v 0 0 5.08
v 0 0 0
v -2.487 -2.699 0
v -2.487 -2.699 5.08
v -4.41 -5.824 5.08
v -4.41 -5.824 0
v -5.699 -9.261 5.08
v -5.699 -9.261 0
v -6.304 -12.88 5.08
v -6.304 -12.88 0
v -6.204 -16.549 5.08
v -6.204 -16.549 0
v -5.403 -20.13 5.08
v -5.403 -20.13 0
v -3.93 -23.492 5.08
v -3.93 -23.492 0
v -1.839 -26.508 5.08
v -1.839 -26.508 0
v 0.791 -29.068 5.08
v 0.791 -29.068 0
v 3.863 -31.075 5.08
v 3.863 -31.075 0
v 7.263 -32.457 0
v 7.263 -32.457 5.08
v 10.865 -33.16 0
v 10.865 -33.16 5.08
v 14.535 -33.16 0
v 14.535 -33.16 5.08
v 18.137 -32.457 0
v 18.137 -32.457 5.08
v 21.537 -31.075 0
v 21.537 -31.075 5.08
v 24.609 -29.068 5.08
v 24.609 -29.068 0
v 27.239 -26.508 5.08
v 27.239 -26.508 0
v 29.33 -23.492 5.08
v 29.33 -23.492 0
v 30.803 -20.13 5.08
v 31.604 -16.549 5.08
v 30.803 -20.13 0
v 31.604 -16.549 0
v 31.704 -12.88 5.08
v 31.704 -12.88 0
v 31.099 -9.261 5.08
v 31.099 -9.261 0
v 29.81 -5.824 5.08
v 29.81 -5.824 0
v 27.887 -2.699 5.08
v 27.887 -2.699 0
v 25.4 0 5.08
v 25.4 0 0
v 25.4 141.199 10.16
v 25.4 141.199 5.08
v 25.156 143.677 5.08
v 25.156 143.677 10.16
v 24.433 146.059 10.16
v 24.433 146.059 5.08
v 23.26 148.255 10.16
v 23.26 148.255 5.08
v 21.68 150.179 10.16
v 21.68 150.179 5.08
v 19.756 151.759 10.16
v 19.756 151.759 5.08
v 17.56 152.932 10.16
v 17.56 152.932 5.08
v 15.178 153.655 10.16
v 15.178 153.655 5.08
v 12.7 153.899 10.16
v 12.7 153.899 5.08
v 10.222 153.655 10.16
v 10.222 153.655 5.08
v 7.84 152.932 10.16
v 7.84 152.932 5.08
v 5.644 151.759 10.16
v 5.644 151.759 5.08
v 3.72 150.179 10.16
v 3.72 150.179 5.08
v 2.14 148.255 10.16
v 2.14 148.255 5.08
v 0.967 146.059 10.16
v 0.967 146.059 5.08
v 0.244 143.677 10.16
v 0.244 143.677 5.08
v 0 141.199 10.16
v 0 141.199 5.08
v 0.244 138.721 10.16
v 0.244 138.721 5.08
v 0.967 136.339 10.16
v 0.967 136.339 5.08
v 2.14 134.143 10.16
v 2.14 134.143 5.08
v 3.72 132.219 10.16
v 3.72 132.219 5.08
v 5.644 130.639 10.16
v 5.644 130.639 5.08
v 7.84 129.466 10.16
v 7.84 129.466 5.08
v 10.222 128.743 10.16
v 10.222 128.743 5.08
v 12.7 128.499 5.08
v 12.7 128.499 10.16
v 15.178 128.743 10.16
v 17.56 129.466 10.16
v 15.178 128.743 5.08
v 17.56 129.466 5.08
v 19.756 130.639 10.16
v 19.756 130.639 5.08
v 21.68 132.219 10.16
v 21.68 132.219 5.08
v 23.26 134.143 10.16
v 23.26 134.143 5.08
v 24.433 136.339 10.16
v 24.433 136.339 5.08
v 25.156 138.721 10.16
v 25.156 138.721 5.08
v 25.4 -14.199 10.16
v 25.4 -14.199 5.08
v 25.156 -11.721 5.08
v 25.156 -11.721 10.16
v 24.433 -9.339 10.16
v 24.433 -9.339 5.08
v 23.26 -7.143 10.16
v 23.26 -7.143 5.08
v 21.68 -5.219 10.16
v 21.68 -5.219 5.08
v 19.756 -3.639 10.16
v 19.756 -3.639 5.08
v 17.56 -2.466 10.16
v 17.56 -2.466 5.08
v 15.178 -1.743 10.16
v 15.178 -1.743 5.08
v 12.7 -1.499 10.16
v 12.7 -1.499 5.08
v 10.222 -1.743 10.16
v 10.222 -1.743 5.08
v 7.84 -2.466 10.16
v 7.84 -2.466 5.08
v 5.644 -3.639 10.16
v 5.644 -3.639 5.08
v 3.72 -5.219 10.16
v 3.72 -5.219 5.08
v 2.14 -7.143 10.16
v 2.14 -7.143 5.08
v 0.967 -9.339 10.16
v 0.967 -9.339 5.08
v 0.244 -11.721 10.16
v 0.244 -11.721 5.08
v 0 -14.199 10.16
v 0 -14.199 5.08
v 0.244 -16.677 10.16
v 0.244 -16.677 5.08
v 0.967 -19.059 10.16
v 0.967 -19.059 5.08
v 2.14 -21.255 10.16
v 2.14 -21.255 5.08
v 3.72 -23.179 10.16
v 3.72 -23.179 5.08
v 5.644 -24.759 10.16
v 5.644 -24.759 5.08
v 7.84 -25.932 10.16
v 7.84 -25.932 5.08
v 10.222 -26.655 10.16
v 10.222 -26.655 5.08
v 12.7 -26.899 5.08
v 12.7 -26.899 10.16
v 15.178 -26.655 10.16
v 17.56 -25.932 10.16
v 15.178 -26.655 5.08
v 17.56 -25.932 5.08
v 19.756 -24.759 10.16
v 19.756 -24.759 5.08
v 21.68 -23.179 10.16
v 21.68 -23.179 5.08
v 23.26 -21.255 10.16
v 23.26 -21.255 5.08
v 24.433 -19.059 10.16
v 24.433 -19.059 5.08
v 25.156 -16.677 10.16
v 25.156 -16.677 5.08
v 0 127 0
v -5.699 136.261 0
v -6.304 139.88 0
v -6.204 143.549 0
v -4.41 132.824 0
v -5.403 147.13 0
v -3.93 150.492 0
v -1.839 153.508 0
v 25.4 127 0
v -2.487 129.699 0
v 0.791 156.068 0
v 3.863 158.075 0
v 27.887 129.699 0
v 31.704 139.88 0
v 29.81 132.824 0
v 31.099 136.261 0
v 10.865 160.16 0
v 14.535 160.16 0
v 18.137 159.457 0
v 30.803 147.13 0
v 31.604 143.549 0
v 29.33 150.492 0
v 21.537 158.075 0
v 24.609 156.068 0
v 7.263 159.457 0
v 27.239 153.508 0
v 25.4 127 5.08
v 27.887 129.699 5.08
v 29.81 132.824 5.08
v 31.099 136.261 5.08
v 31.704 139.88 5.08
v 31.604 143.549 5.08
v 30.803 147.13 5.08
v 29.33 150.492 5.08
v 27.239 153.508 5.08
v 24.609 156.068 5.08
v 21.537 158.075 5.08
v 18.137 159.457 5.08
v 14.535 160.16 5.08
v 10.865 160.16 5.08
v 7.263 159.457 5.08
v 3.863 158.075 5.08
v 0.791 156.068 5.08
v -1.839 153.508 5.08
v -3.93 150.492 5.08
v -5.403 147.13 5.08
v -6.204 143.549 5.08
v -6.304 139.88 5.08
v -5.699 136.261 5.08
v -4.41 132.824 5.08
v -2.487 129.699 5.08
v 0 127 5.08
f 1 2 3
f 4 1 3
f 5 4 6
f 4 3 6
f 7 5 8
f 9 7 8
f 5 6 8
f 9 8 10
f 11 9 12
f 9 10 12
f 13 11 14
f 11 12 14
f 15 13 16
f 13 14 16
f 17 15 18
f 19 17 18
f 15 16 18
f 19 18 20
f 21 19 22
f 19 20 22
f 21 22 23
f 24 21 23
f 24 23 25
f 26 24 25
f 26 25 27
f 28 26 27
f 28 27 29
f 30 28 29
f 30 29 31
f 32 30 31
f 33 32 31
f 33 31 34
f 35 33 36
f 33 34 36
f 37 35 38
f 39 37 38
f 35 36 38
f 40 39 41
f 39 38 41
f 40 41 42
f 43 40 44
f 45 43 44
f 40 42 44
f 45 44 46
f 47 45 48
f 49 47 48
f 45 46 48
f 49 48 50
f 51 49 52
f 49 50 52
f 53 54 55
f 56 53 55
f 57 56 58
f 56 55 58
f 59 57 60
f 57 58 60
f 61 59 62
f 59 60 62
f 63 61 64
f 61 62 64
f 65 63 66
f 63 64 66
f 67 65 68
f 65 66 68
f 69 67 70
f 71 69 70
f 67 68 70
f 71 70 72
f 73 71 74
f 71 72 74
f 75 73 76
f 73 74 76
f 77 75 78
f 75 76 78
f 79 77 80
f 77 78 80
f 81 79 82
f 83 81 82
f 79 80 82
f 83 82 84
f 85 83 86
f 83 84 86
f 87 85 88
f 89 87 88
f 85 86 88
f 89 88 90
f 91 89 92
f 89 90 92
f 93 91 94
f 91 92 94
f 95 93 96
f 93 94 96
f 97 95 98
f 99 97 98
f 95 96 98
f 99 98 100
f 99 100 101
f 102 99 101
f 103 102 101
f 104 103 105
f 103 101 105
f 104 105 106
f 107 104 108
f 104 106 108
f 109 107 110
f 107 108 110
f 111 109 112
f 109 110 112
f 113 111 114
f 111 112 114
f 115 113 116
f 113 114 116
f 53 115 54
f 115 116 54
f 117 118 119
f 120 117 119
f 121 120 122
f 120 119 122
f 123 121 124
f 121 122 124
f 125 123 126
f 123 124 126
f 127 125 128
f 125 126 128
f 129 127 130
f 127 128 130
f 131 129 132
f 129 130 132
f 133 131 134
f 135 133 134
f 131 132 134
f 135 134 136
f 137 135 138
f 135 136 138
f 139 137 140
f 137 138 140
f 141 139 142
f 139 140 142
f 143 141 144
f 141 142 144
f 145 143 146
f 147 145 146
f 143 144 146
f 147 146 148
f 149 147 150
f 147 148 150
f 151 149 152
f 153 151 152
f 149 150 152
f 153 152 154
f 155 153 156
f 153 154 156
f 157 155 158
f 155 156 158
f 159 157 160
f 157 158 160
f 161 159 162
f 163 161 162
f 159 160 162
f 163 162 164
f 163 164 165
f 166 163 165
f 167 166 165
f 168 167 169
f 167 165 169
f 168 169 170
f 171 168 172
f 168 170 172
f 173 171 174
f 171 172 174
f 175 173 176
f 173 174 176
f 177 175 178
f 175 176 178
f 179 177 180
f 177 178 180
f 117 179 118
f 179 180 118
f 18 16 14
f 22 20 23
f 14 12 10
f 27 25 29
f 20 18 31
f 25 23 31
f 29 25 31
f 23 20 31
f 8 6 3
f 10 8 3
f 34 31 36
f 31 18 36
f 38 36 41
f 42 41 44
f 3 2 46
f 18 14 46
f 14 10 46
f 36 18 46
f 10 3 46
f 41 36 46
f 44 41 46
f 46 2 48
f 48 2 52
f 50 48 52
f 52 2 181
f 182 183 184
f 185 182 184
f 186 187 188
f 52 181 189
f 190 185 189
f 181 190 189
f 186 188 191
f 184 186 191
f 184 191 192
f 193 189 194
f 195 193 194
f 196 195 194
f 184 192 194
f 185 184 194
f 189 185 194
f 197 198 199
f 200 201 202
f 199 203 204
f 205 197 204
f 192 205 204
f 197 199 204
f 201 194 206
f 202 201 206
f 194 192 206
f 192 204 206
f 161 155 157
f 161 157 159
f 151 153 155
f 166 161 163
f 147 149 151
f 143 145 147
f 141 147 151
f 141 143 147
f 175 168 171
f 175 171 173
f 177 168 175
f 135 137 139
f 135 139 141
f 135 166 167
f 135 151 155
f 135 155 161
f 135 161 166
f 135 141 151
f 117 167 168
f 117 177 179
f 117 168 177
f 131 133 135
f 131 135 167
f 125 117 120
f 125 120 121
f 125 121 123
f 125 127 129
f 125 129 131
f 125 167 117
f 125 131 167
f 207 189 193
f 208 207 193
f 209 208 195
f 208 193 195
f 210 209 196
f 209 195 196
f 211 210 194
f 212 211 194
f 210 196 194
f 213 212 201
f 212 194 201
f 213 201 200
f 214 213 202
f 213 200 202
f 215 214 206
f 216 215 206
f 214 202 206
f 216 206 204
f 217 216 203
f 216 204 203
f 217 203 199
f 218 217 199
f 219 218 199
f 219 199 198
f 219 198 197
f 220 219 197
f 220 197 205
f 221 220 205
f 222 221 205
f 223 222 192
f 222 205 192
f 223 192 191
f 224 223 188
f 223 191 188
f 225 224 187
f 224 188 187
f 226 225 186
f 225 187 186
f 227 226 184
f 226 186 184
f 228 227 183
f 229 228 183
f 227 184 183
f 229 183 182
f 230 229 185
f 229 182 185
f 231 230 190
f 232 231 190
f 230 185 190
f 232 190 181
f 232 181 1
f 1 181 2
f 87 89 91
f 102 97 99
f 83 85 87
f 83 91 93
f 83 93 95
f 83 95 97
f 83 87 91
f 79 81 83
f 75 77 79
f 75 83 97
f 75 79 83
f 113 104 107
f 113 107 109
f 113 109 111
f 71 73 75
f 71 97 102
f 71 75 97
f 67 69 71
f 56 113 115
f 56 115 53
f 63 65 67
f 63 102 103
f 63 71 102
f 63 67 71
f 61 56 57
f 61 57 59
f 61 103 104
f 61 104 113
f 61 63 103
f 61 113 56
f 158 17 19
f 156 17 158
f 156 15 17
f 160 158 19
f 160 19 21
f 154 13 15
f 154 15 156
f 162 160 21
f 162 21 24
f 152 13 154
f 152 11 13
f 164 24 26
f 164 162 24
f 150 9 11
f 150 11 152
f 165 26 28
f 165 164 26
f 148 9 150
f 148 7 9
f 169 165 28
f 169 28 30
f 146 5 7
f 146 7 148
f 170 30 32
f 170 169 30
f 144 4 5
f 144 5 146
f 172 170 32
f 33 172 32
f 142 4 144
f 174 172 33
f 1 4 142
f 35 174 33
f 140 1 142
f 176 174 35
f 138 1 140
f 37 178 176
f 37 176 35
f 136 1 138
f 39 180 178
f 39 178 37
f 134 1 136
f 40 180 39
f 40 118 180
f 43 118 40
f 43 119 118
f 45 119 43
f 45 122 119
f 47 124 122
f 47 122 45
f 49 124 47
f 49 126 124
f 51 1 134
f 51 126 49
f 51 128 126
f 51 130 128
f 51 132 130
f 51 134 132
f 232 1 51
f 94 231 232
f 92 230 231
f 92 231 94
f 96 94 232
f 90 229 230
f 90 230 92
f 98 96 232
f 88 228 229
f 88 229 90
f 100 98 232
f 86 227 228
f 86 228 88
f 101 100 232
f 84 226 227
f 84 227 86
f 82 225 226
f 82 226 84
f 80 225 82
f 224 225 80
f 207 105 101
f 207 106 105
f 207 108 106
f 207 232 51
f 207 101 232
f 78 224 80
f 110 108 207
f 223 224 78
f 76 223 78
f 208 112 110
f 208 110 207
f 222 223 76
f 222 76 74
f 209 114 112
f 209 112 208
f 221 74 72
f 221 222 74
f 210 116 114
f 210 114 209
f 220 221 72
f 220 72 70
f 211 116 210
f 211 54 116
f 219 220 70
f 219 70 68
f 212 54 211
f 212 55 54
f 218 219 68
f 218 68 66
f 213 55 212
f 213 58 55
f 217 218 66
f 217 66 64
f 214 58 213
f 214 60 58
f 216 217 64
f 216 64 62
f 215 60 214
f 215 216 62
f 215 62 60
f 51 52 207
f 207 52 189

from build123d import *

# Parameters (mm, degrees)
F1_DEPTH = 5.08
F2_R     = 12.7
F3_DEPTH = 5.08


with BuildPart() as f1:
    # F0 (on Top) → F1 (new body)
    with BuildSketch(Plane.XY):
        with BuildLine():
            ThreePointArc((25.4, 0), (12.7, 4.8509683429), (0, 0))
            Line((0, 0), (25.4, 0))
        make_face()
        with BuildLine():
            Line((0, 127), (0, 0))
            ThreePointArc((0, 0), (12.7, 4.8509683429), (25.4, 0))
            Line((25.4, 0), (25.4, 127))
            ThreePointArc((25.4, 127), (12.7, 122.1490316571), (0, 127))
        make_face()
        with BuildLine():
            Line((25.4, 0), (0, 0))
            ThreePointArc((0, 0), (4.9228700667, -31.5892228579), (31.75, -14.1990316571))
            ThreePointArc((31.75, -14.1990316571), (30.0901912008, -6.4219017238), (25.4, 0))
        make_face()
        with BuildLine():
            ThreePointArc((31.75, 141.1990316571), (4.9228700667, 158.5892228579), (0, 127))
            Line((0, 127), (25.4, 127))
            ThreePointArc((25.4, 127), (30.0901912008, 133.4219017238), (31.75, 141.1990316571))
        make_face()
        with BuildLine():
            Line((25.4, 127), (0, 127))
            ThreePointArc((0, 127), (12.7, 122.1490316571), (25.4, 127))
        make_face()
    extrude(amount=F1_DEPTH)

    # F2 (on face) → F3 (join)
    with BuildSketch(Plane.XY.offset(5.08)):
        with Locations((12.7, -14.1990316571)):
            Circle(F2_R)
        with Locations((12.7, 141.1990316571)):
            Circle(F2_R)
    extrude(amount=F3_DEPTH)


solid = f1.part
